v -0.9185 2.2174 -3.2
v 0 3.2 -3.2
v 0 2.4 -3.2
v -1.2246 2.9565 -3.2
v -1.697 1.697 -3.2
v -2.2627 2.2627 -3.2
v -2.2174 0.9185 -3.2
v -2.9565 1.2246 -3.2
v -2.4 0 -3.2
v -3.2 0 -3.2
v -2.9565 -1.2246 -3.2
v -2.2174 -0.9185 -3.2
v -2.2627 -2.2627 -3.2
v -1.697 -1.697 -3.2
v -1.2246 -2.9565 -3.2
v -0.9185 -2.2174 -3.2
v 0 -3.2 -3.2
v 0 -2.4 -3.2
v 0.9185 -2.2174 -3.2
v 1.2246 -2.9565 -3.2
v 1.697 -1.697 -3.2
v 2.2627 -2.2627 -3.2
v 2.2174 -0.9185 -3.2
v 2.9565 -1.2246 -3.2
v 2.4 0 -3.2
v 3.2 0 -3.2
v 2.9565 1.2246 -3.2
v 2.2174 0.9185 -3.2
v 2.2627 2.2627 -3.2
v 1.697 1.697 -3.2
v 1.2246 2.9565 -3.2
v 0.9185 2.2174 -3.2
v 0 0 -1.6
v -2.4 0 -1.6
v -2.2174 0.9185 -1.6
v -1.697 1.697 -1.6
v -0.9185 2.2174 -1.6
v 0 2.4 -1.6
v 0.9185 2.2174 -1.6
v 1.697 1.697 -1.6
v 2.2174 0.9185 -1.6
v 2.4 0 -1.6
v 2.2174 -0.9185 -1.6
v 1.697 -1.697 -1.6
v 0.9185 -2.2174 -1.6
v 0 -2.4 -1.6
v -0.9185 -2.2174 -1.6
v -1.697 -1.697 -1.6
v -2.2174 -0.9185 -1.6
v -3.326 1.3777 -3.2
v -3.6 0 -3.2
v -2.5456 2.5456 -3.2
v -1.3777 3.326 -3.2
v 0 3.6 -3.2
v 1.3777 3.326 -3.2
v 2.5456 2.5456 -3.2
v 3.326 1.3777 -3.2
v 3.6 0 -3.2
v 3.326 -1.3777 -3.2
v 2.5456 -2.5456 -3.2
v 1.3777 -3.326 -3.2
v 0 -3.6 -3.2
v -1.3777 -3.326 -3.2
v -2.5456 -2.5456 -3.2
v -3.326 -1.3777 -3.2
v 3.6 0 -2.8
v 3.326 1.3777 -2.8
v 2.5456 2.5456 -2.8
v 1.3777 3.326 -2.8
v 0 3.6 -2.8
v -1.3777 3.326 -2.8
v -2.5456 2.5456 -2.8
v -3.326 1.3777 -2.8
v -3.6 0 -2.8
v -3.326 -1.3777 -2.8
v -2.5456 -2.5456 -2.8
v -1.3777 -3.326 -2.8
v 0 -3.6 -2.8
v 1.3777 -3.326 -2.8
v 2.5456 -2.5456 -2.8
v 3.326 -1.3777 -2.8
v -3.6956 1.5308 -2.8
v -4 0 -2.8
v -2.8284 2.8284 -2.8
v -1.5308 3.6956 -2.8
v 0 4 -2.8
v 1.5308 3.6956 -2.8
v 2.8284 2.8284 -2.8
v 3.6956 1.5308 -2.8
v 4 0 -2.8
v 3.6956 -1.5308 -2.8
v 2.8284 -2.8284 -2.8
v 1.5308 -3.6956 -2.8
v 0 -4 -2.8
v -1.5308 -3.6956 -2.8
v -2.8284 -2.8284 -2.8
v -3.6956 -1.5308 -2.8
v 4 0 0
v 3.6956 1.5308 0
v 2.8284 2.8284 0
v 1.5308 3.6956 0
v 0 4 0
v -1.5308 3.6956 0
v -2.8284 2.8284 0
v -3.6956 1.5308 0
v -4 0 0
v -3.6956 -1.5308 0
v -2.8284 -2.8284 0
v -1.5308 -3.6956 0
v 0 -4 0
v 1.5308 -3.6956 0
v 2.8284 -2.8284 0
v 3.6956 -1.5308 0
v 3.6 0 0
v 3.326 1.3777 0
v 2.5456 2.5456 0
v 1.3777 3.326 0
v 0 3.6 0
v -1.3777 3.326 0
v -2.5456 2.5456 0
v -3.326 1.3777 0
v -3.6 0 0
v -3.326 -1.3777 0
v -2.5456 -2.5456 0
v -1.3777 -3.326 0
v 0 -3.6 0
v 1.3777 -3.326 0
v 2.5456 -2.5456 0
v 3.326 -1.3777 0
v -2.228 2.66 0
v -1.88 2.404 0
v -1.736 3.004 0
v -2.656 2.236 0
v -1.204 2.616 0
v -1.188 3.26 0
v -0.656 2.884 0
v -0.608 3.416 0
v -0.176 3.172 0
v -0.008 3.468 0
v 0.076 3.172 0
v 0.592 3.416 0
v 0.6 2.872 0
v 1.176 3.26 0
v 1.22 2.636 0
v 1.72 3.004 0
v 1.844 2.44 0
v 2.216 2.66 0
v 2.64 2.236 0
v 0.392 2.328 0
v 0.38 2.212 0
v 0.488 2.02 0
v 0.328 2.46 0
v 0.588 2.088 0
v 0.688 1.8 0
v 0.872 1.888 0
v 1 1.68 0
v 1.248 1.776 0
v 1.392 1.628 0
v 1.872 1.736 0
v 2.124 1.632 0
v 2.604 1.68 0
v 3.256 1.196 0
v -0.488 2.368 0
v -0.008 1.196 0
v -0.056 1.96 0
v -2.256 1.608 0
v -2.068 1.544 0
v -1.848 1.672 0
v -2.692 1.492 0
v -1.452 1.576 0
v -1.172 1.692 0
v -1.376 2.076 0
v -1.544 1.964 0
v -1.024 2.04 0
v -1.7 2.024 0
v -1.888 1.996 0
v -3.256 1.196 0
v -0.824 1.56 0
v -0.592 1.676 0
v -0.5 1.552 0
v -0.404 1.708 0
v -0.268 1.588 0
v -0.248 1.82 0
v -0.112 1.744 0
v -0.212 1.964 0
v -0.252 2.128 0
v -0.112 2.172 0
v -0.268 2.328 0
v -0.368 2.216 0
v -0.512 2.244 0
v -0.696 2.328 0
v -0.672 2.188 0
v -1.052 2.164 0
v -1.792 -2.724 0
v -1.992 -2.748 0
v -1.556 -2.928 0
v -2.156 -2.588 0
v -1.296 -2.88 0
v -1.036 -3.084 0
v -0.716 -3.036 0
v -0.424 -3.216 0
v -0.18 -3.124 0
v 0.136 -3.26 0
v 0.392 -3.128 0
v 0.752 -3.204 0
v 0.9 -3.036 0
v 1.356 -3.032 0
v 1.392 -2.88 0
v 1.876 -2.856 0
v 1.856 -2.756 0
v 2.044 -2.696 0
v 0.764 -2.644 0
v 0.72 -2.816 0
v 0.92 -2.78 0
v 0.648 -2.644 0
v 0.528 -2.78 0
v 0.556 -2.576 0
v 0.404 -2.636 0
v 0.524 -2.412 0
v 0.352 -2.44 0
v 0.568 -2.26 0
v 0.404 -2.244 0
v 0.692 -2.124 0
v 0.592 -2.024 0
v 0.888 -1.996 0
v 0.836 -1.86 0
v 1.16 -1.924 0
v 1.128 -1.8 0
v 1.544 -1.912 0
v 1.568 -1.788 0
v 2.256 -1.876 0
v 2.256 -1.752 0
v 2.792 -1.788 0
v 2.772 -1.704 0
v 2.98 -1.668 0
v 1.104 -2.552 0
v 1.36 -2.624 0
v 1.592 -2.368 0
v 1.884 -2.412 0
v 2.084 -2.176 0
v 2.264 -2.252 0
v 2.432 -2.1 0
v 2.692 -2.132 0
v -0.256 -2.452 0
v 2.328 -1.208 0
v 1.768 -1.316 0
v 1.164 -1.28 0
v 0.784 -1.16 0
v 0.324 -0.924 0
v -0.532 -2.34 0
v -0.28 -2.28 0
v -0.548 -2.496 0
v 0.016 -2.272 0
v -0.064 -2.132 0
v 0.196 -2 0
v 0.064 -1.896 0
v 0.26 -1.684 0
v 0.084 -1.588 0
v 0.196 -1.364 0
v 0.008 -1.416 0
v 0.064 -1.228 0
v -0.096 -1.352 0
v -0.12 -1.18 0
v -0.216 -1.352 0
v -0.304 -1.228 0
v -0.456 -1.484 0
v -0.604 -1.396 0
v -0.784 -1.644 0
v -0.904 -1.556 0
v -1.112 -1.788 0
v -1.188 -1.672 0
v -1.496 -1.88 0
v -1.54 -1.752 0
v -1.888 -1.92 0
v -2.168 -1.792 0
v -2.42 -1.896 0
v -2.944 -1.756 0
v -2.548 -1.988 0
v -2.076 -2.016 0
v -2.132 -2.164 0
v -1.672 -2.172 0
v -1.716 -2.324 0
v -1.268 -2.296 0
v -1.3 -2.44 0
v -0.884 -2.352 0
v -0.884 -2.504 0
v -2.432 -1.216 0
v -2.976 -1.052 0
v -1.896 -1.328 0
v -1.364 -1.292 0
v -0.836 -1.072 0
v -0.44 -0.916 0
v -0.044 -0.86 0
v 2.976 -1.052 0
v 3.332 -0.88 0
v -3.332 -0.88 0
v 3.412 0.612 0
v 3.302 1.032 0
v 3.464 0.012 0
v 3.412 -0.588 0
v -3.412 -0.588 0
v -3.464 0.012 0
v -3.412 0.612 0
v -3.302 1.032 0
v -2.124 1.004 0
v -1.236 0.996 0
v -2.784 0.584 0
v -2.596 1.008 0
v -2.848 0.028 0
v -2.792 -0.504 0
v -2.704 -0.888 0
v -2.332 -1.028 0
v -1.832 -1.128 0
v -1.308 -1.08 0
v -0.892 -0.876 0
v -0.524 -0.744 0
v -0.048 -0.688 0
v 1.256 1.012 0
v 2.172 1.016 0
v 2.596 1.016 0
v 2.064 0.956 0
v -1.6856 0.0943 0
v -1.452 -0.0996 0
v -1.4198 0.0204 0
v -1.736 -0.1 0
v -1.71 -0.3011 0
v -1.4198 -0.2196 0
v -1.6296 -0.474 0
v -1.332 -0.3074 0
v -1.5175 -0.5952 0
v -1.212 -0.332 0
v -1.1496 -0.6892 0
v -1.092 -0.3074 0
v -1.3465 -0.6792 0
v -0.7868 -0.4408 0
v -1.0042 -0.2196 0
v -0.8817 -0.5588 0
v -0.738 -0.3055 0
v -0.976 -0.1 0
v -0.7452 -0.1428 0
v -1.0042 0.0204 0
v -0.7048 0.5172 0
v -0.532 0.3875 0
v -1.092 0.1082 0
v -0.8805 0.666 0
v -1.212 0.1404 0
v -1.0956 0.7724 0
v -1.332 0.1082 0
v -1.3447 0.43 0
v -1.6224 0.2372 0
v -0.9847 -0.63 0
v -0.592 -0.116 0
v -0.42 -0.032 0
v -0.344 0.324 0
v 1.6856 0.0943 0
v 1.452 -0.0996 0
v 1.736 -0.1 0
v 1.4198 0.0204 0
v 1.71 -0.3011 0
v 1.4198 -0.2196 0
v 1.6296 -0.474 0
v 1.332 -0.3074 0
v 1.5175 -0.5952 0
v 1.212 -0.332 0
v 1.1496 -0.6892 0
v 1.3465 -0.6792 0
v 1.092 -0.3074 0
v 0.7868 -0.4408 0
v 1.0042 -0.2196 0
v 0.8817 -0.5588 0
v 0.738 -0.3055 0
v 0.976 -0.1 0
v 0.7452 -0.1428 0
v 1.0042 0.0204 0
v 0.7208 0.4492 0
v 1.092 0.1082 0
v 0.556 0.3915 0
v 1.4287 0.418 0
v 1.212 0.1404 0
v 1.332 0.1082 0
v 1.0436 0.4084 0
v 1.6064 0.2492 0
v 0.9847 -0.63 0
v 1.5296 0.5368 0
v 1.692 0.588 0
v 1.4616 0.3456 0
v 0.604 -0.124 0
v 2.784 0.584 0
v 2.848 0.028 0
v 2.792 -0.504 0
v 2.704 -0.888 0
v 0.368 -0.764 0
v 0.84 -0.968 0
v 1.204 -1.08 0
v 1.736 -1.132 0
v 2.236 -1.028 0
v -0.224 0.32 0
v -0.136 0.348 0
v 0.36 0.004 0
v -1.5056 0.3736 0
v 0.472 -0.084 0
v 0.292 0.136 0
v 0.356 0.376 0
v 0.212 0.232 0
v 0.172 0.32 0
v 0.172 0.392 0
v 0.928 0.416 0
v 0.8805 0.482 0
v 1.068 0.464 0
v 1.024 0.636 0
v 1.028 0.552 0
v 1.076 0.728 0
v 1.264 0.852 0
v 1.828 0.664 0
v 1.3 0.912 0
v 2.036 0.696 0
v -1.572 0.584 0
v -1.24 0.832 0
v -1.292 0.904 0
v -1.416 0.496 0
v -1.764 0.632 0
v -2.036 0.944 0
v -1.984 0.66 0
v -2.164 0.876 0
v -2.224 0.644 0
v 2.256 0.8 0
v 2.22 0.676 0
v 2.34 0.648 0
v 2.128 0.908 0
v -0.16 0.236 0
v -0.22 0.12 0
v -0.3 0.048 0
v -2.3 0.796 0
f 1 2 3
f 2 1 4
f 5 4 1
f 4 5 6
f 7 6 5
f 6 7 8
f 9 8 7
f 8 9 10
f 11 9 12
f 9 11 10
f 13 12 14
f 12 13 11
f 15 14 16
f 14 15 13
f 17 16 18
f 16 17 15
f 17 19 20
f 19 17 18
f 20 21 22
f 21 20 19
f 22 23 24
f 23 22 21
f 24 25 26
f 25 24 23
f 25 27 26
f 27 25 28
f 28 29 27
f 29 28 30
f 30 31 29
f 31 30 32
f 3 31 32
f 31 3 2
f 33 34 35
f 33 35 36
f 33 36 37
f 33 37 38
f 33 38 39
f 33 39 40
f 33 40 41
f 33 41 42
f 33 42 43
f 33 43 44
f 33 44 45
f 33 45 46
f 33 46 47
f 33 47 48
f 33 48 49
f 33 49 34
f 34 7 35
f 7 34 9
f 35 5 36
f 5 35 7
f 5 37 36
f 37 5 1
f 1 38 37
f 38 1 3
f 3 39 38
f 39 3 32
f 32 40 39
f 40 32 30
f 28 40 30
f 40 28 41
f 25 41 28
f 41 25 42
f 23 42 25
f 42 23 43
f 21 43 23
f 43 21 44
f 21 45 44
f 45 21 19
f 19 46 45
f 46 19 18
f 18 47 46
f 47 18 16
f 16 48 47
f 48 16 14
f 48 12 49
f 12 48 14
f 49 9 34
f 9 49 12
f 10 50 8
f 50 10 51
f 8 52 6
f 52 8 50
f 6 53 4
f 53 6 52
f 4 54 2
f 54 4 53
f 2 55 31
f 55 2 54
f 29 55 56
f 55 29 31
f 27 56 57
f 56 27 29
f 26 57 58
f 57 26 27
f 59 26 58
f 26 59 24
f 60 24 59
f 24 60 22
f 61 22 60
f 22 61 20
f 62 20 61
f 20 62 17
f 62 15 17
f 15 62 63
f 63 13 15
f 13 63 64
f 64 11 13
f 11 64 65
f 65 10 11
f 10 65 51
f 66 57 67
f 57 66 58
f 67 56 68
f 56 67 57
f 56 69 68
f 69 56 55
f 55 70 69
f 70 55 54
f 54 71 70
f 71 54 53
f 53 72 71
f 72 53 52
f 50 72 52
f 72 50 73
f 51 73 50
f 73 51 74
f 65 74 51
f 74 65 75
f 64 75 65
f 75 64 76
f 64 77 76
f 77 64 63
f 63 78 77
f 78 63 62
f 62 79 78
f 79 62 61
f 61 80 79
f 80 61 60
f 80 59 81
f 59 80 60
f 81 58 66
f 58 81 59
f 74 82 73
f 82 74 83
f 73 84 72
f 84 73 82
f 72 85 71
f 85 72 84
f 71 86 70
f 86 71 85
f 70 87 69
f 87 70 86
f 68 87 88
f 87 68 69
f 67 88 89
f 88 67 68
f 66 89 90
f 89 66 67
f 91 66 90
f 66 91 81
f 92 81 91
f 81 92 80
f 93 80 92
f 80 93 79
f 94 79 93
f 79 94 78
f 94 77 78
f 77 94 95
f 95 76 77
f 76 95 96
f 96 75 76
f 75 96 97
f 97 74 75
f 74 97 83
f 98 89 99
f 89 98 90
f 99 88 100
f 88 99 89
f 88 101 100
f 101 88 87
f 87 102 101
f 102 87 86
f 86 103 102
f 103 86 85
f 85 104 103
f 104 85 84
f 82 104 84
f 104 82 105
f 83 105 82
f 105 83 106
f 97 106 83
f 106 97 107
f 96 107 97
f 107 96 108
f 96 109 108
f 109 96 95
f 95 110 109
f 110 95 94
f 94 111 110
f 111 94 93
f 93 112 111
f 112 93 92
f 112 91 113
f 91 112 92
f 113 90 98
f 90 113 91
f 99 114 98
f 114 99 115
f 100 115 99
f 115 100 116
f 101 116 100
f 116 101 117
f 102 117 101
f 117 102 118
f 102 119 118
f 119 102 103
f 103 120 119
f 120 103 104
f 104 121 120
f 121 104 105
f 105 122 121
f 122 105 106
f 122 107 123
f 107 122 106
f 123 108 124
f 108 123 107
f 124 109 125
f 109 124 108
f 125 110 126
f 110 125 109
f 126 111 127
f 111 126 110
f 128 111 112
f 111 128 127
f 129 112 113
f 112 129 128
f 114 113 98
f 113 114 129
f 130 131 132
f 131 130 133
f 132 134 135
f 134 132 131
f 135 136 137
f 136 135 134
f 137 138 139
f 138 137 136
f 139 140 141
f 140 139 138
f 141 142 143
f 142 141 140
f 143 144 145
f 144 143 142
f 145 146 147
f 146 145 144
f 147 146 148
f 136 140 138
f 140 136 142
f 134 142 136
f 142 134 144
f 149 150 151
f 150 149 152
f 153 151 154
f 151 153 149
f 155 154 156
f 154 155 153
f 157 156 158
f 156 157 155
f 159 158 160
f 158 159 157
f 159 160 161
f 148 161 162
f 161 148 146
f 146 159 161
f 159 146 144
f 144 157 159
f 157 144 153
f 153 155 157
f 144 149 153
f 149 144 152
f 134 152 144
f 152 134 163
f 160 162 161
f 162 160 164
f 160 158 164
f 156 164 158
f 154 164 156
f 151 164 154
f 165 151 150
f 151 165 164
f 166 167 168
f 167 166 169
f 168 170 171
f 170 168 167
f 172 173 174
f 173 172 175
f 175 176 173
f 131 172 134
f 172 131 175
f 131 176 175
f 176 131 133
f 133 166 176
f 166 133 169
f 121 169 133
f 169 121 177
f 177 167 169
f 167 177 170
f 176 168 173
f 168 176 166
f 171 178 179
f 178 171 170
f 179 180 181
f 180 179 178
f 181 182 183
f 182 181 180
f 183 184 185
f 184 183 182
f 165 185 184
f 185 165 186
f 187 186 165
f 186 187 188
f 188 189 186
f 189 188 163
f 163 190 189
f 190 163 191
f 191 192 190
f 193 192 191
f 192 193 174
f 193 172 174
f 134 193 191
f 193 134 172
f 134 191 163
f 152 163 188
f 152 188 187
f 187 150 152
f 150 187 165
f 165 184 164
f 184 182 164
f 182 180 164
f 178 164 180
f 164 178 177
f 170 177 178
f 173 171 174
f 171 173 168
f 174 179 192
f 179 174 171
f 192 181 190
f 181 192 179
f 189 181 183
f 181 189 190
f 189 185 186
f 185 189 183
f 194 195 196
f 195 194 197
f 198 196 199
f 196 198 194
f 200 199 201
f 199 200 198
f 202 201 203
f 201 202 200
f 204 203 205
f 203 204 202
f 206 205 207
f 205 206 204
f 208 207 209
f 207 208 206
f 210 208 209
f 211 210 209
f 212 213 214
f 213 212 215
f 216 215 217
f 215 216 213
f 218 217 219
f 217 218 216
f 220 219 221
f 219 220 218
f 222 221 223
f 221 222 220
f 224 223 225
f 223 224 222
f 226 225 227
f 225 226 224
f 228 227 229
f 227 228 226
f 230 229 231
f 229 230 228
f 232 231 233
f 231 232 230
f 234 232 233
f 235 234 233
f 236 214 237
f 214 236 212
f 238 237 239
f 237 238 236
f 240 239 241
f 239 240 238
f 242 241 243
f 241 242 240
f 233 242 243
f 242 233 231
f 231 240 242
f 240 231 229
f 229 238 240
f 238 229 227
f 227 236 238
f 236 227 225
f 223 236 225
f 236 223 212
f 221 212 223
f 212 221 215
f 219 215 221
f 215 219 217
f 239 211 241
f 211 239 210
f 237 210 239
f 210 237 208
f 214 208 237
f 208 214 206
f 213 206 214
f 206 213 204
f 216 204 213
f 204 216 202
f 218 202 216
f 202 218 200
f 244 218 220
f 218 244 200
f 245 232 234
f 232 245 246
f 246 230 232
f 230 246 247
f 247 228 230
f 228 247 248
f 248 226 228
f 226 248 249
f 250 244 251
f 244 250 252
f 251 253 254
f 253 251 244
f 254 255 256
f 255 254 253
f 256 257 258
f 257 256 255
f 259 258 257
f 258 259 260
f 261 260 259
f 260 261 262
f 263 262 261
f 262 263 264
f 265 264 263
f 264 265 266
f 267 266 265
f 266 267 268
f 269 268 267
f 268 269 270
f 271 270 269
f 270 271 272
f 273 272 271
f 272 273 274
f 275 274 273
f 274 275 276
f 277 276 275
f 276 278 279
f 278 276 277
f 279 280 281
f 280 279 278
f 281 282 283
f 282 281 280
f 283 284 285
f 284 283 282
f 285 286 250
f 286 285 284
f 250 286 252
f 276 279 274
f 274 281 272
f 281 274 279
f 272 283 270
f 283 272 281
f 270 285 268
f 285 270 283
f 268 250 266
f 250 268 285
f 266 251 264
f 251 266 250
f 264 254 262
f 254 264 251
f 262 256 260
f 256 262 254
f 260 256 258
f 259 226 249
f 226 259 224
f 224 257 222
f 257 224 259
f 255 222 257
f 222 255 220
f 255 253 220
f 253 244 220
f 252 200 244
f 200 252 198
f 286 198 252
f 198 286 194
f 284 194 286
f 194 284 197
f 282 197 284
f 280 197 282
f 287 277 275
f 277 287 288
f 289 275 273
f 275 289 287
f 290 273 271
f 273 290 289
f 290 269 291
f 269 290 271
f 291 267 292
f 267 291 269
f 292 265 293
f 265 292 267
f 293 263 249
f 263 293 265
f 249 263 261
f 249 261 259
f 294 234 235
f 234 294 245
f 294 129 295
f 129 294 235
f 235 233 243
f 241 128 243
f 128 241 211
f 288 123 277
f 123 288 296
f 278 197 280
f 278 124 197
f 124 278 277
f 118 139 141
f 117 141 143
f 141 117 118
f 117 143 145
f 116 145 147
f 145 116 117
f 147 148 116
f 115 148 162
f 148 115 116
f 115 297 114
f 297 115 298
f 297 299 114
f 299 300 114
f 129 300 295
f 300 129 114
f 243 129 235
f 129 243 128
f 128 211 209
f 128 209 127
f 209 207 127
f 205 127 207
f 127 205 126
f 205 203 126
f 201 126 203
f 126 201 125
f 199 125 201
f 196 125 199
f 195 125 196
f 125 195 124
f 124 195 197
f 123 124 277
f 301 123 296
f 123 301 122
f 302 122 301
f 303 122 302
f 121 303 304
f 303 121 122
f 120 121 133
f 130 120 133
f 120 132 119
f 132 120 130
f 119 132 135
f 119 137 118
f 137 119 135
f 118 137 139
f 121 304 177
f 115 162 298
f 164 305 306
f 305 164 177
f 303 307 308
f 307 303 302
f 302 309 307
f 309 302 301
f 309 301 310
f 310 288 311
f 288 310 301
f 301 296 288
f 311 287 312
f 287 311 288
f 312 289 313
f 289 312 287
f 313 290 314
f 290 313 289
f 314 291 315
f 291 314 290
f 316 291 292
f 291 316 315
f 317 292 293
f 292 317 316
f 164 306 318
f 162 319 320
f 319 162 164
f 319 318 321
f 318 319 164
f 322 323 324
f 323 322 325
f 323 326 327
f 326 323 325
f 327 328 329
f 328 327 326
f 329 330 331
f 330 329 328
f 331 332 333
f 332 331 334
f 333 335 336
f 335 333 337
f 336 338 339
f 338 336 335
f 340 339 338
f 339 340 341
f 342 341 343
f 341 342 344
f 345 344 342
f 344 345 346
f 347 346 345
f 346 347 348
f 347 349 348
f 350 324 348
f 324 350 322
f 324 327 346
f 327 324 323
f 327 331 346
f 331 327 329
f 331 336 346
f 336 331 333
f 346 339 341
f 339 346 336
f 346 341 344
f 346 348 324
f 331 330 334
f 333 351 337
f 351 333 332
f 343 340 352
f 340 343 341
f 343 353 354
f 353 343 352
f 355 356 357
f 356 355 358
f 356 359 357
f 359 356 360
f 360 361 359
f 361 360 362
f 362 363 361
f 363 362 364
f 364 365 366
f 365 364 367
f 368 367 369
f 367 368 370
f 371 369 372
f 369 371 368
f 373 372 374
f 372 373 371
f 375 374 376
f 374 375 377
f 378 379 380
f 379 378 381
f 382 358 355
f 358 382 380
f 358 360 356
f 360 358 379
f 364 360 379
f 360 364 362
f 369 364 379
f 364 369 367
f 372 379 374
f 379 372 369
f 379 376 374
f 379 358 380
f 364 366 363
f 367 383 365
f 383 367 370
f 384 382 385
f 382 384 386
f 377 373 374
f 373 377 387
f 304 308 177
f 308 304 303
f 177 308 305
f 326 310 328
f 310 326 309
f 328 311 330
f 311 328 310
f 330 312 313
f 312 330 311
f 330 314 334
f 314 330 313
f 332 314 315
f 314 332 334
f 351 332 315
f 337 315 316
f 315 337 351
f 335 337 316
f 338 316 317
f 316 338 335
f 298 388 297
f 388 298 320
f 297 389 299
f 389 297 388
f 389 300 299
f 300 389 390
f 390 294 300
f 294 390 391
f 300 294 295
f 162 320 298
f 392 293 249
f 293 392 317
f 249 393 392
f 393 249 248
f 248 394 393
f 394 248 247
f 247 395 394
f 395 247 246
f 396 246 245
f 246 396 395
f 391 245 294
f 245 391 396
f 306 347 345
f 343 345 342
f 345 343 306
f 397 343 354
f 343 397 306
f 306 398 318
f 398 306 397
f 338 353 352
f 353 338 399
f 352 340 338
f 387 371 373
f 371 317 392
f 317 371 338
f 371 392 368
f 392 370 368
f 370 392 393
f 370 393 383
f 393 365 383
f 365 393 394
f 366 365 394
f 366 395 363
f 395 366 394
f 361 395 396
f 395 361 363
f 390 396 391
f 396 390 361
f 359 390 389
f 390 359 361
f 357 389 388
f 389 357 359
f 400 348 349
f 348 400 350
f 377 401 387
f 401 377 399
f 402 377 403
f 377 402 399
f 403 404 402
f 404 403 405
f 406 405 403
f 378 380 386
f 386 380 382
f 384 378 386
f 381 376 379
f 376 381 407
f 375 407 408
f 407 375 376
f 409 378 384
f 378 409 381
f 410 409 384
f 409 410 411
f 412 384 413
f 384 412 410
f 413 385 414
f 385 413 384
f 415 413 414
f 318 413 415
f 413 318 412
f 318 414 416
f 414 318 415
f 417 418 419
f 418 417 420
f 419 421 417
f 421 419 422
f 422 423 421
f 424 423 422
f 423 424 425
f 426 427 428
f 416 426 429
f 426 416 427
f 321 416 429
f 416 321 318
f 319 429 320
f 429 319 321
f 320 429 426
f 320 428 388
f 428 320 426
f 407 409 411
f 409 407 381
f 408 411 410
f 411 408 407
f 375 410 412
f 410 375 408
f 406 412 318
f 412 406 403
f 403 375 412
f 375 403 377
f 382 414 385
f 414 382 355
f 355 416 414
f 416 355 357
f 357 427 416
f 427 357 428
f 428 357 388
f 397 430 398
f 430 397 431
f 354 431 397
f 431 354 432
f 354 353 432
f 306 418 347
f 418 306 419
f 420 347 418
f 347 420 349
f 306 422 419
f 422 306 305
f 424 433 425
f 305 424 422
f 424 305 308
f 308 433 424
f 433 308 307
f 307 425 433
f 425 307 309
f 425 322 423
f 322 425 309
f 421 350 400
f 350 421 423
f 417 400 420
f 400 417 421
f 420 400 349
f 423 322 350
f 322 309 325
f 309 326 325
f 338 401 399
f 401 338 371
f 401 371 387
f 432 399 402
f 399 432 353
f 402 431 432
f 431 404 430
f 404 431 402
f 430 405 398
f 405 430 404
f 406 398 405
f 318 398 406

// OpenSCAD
use <../lib.scad>
use <../p/4-4ering.scad>
use <s/98138pn0s01.scad>
use <s/98138s01.scad>
$fa=1; $fs=0.2;
function ldraw_lib__98138pn6(realsolid=false) = [
// 0 Tile  1 x  1 Round with Ninjago Trapped Kai Patternn
// 0 Name: 98138pn6.dat
// 0 Author: Gerald Lasser [GeraldLasser]
// 0 !LDRAW_ORG Part UPDATE 2017-01
// 0 !LICENSE Licensed under CC BY 2.0 and CC BY 4.0 : see CAreadme.txt
// 
// 0 BFC CERTIFY CCW
  [0,"BFC","CERTIFY"],
  [0,"BFC","CCW"],
// 
// 0 !KEYWORDS BrickLink 98138pb048
// 
// 0 !HISTORY 2017-12-30 [PTadmin] Official Update 2017-01
// 
// 
// 1 16 0 0 0 1 0 0 0 1 0 0 0 1 s\98138s01.dat
  [1,16,0,0,0,1,0,0,0,1,0,0,0,1, ldraw_lib__s__98138s01(realsolid)],
// 1 16 0 0 0 9 0 0 0 1 0 0 0 9 4-4ering.dat
  [1,16,0,0,0,9,0,0,0,1,0,0,0,9, ldraw_lib__4_4ering(realsolid)],
// 1 16 0 0 0 1 0 0 0 1 0 0 0 1 s\98138pn0s01.dat
  [1,16,0,0,0,1,0,0,0,1,0,0,0,1, ldraw_lib__s__98138pn0s01(realsolid)],
// 4 0 -5.31 0 2.51 -3.09 0 2.49 -0.02 0 2.99 -8.14 0 2.99
  [4,0,-5.31,0,2.51,-3.09,0,2.49,-0.02,0,2.99,-8.14,0,2.99],
// 4 0 -6.96 0 1.46 -6.49 0 2.52 -8.53 0 1.53 -8.66 0 0.03
  [4,0,-6.96,0,1.46,-6.49,0,2.52,-8.53,0,1.53,-8.66,0,0.03],
// 4 0 -7.12 0 0.07 -6.96 0 1.46 -8.66 0 0.03 -8.53 0 -1.47
  [4,0,-7.12,0,0.07,-6.96,0,1.46,-8.66,0,0.03,-8.53,0,-1.47],
// 3 0 -7.12 0 0.07 -8.53 0 -1.47 -6.98 0 -1.26
  [3,0,-7.12,0,0.07,-8.53,0,-1.47,-6.98,0,-1.26],
// 4 0 -6.76 0 -2.22 -6.98 0 -1.26 -8.53 0 -1.47 -7.44 0 -2.63
  [4,0,-6.76,0,-2.22,-6.98,0,-1.26,-8.53,0,-1.47,-7.44,0,-2.63],
// 3 0 -8.53 0 -1.47 -8.33 0 -2.2 -7.44 0 -2.63
  [3,0,-8.53,0,-1.47,-8.33,0,-2.2,-7.44,0,-2.63],
// 4 0 -6.08 0 -3.04 -5.83 0 -2.57 -6.76 0 -2.22 -7.44 0 -2.63
  [4,0,-6.08,0,-3.04,-5.83,0,-2.57,-6.76,0,-2.22,-7.44,0,-2.63],
// 4 0 -4.74 0 -3.32 -4.58 0 -2.82 -5.83 0 -2.57 -6.08 0 -3.04
  [4,0,-4.74,0,-3.32,-4.58,0,-2.82,-5.83,0,-2.57,-6.08,0,-3.04],
// 4 0 -3.41 0 -3.23 -3.27 0 -2.7 -4.58 0 -2.82 -4.74 0 -3.32
  [4,0,-3.41,0,-3.23,-3.27,0,-2.7,-4.58,0,-2.82,-4.74,0,-3.32],
// 4 0 -2.09 0 -2.68 -2.23 0 -2.19 -3.27 0 -2.7 -3.41 0 -3.23
  [4,0,-2.09,0,-2.68,-2.23,0,-2.19,-3.27,0,-2.7,-3.41,0,-3.23],
// 4 0 -1.1 0 -2.29 -1.31 0 -1.86 -2.23 0 -2.19 -2.09 0 -2.68
  [4,0,-1.1,0,-2.29,-1.31,0,-1.86,-2.23,0,-2.19,-2.09,0,-2.68],
// 4 0 -0.11 0 -2.15 -0.12 0 -1.72 -1.31 0 -1.86 -1.1 0 -2.29
  [4,0,-0.11,0,-2.15,-0.12,0,-1.72,-1.31,0,-1.86,-1.1,0,-2.29],
// 3 0 -0.02 0 2.99 -3.09 0 2.49 3.14 0 2.53
  [3,0,-0.02,0,2.99,-3.09,0,2.49,3.14,0,2.53],
// 4 0 5.43 0 2.54 6.49 0 2.54 8.14 0 2.99 -0.02 0 2.99
  [4,0,5.43,0,2.54,6.49,0,2.54,8.14,0,2.99,-0.02,0,2.99],
// 4 0 5.43 0 2.54 -0.02 0 2.99 3.14 0 2.53 5.16 0 2.39
  [4,0,5.43,0,2.54,-0.02,0,2.99,3.14,0,2.53,5.16,0,2.39],
// 4 0 -3.63 0 -0.249 -3.5496 0 0.051 -4.2139 0 0.2357 -4.34 0 -0.25
  [4,0,-3.63,0,-0.249,-3.5496,0,0.051,-4.2139,0,0.2357,-4.34,0,-0.25],
// 4 0 -3.5496 0 -0.549 -3.63 0 -0.249 -4.34 0 -0.25 -4.2749 0 -0.7527
  [4,0,-3.5496,0,-0.549,-3.63,0,-0.249,-4.34,0,-0.25,-4.2749,0,-0.7527],
// 4 0 -3.33 0 -0.7686 -3.5496 0 -0.549 -4.2749 0 -0.7527 -4.0741 0 -1.1851
  [4,0,-3.33,0,-0.7686,-3.5496,0,-0.549,-4.2749,0,-0.7527,-4.0741,0,-1.1851],
// 4 0 -3.33 0 -0.7686 -4.0741 0 -1.1851 -3.7937 0 -1.4879 -3.03 0 -0.83
  [4,0,-3.33,0,-0.7686,-4.0741,0,-1.1851,-3.7937,0,-1.4879,-3.03,0,-0.83],
// 4 0 -2.874 0 -1.723 -2.73 0 -0.7686 -3.03 0 -0.83 -3.3663 0 -1.6979
  [4,0,-2.874,0,-1.723,-2.73,0,-0.7686,-3.03,0,-0.83,-3.3663,0,-1.6979],
// 4 0 -2.5104 0 -0.549 -2.73 0 -0.7686 -2.2043 0 -1.3969 -1.9669 0 -1.1021
  [4,0,-2.5104,0,-0.549,-2.73,0,-0.7686,-2.2043,0,-1.3969,-1.9669,0,-1.1021],
// 4 0 -2.5104 0 -0.549 -1.9669 0 -1.1021 -1.8451 0 -0.7637 -2.44 0 -0.25
  [4,0,-2.5104,0,-0.549,-1.9669,0,-1.1021,-1.8451,0,-0.7637,-2.44,0,-0.25],
// 4 0 -2.44 0 -0.25 -1.8451 0 -0.7637 -1.863 0 -0.357 -2.5104 0 0.051
  [4,0,-2.44,0,-0.25,-1.8451,0,-0.7637,-1.863,0,-0.357,-2.5104,0,0.051],
// 4 0 -2.5104 0 0.051 -1.3301 0 0.9687 -1.7619 0 1.2931 -2.73 0 0.2706
  [4,0,-2.5104,0,0.051,-1.3301,0,0.9687,-1.7619,0,1.2931,-2.73,0,0.2706],
// 4 0 -2.73 0 0.2706 -1.7619 0 1.2931 -2.2013 0 1.6649 -3.03 0 0.351
  [4,0,-2.73,0,0.2706,-1.7619,0,1.2931,-2.2013,0,1.6649,-3.03,0,0.351],
// 4 0 -3.03 0 0.351 -2.2013 0 1.6649 -2.739 0 1.931 -3.33 0 0.2706
  [4,0,-3.03,0,0.351,-2.2013,0,1.6649,-2.739,0,1.931,-3.33,0,0.2706],
// 3 0 -2.739 0 1.931 -3.3617 0 1.0749 -3.33 0 0.2706
  [3,0,-2.739,0,1.931,-3.3617,0,1.0749,-3.33,0,0.2706],
// 4 0 -3.5496 0 0.051 -3.33 0 0.2706 -4.0561 0 0.5931 -4.2139 0 0.2357
  [4,0,-3.5496,0,0.051,-3.33,0,0.2706,-4.0561,0,0.5931,-4.2139,0,0.2357],
// 4 14 -3.03 0 0.351 -3.5496 0 0.051 -3.63 0 -0.249 -3.5496 0 -0.549
  [4,14,-3.03,0,0.351,-3.5496,0,0.051,-3.63,0,-0.249,-3.5496,0,-0.549],
// 4 14 -3.03 0 0.351 -3.5496 0 -0.549 -3.33 0 -0.7686 -3.03 0 -0.83
  [4,14,-3.03,0,0.351,-3.5496,0,-0.549,-3.33,0,-0.7686,-3.03,0,-0.83],
// 4 14 -3.03 0 0.351 -3.03 0 -0.83 -2.73 0 -0.7686 -2.5104 0 -0.549
  [4,14,-3.03,0,0.351,-3.03,0,-0.83,-2.73,0,-0.7686,-2.5104,0,-0.549],
// 4 14 -3.03 0 0.351 -2.5104 0 -0.549 -2.44 0 -0.25 -2.5104 0 0.051
  [4,14,-3.03,0,0.351,-2.5104,0,-0.549,-2.44,0,-0.25,-2.5104,0,0.051],
// 3 14 -3.03 0 0.351 -2.5104 0 0.051 -2.73 0 0.2706
  [3,14,-3.03,0,0.351,-2.5104,0,0.051,-2.73,0,0.2706],
// 3 14 -3.03 0 0.351 -3.33 0 0.2706 -3.5496 0 0.051
  [3,14,-3.03,0,0.351,-3.33,0,0.2706,-3.5496,0,0.051],
// 3 0 -3.03 0 -0.83 -3.7937 0 -1.4879 -3.3663 0 -1.6979
  [3,0,-3.03,0,-0.83,-3.7937,0,-1.4879,-3.3663,0,-1.6979],
// 4 0 -2.73 0 -0.7686 -2.874 0 -1.723 -2.4617 0 -1.5749 -2.2043 0 -1.3969
  [4,0,-2.73,0,-0.7686,-2.874,0,-1.723,-2.4617,0,-1.5749,-2.2043,0,-1.3969],
// 4 0 -1.3301 0 0.9687 -2.5104 0 0.051 -1.863 0 -0.357 -1.48 0 -0.29
  [4,0,-1.3301,0,0.9687,-2.5104,0,0.051,-1.863,0,-0.357,-1.48,0,-0.29],
// 4 0 -1.3301 0 0.9687 -1.48 0 -0.29 -1.05 0 -0.08 -0.86 0 0.81
  [4,0,-1.3301,0,0.9687,-1.48,0,-0.29,-1.05,0,-0.08,-0.86,0,0.81],
// 4 0 4.2139 0 0.2357 3.5496 0 0.051 3.63 0 -0.249 4.34 0 -0.25
  [4,0,4.2139,0,0.2357,3.5496,0,0.051,3.63,0,-0.249,4.34,0,-0.25],
// 4 0 4.34 0 -0.25 3.63 0 -0.249 3.5496 0 -0.549 4.2749 0 -0.7527
  [4,0,4.34,0,-0.25,3.63,0,-0.249,3.5496,0,-0.549,4.2749,0,-0.7527],
// 4 0 4.2749 0 -0.7527 3.5496 0 -0.549 3.33 0 -0.7686 4.0741 0 -1.1851
  [4,0,4.2749,0,-0.7527,3.5496,0,-0.549,3.33,0,-0.7686,4.0741,0,-1.1851],
// 4 0 3.7937 0 -1.4879 4.0741 0 -1.1851 3.33 0 -0.7686 3.03 0 -0.83
  [4,0,3.7937,0,-1.4879,4.0741,0,-1.1851,3.33,0,-0.7686,3.03,0,-0.83],
// 4 0 3.03 0 -0.83 2.73 0 -0.7686 2.874 0 -1.723 3.3663 0 -1.6979
  [4,0,3.03,0,-0.83,2.73,0,-0.7686,2.874,0,-1.723,3.3663,0,-1.6979],
// 4 0 2.2043 0 -1.3969 2.73 0 -0.7686 2.5104 0 -0.549 1.9669 0 -1.1021
  [4,0,2.2043,0,-1.3969,2.73,0,-0.7686,2.5104,0,-0.549,1.9669,0,-1.1021],
// 4 0 1.8451 0 -0.7637 1.9669 0 -1.1021 2.5104 0 -0.549 2.44 0 -0.25
  [4,0,1.8451,0,-0.7637,1.9669,0,-1.1021,2.5104,0,-0.549,2.44,0,-0.25],
// 4 0 1.863 0 -0.357 1.8451 0 -0.7637 2.44 0 -0.25 2.5104 0 0.051
  [4,0,1.863,0,-0.357,1.8451,0,-0.7637,2.44,0,-0.25,2.5104,0,0.051],
// 4 0 1.8019 0 1.1231 1.3901 0 0.9787 2.5104 0 0.051 2.73 0 0.2706
  [4,0,1.8019,0,1.1231,1.3901,0,0.9787,2.5104,0,0.051,2.73,0,0.2706],
// 4 0 2.609 0 1.021 3.03 0 0.351 3.33 0 0.2706 3.5717 0 1.0449
  [4,0,2.609,0,1.021,3.03,0,0.351,3.33,0,0.2706,3.5717,0,1.0449],
// 4 0 4.0161 0 0.6231 3.33 0 0.2706 3.5496 0 0.051 4.2139 0 0.2357
  [4,0,4.0161,0,0.6231,3.33,0,0.2706,3.5496,0,0.051,4.2139,0,0.2357],
// 4 14 3.63 0 -0.249 3.5496 0 0.051 3.03 0 0.351 3.5496 0 -0.549
  [4,14,3.63,0,-0.249,3.5496,0,0.051,3.03,0,0.351,3.5496,0,-0.549],
// 4 14 3.33 0 -0.7686 3.5496 0 -0.549 3.03 0 0.351 3.03 0 -0.83
  [4,14,3.33,0,-0.7686,3.5496,0,-0.549,3.03,0,0.351,3.03,0,-0.83],
// 4 14 2.73 0 -0.7686 3.03 0 -0.83 3.03 0 0.351 2.5104 0 -0.549
  [4,14,2.73,0,-0.7686,3.03,0,-0.83,3.03,0,0.351,2.5104,0,-0.549],
// 4 14 2.44 0 -0.25 2.5104 0 -0.549 3.03 0 0.351 2.5104 0 0.051
  [4,14,2.44,0,-0.25,2.5104,0,-0.549,3.03,0,0.351,2.5104,0,0.051],
// 3 14 3.03 0 0.351 2.73 0 0.2706 2.5104 0 0.051
  [3,14,3.03,0,0.351,2.73,0,0.2706,2.5104,0,0.051],
// 3 14 3.03 0 0.351 3.5496 0 0.051 3.33 0 0.2706
  [3,14,3.03,0,0.351,3.5496,0,0.051,3.33,0,0.2706],
// 3 0 3.03 0 -0.83 3.3663 0 -1.6979 3.7937 0 -1.4879
  [3,0,3.03,0,-0.83,3.3663,0,-1.6979,3.7937,0,-1.4879],
// 4 0 2.4617 0 -1.5749 2.874 0 -1.723 2.73 0 -0.7686 2.2043 0 -1.3969
  [4,0,2.4617,0,-1.5749,2.874,0,-1.723,2.73,0,-0.7686,2.2043,0,-1.3969],
// 4 14 4.0161 0 0.6231 4.23 0 1.47 3.824 0 1.342 3.6539 0 0.864
  [4,14,4.0161,0,0.6231,4.23,0,1.47,3.824,0,1.342,3.6539,0,0.864],
// 4 0 1.863 0 -0.357 2.5104 0 0.051 1.3901 0 0.9787 1.51 0 -0.31
  [4,0,1.863,0,-0.357,2.5104,0,0.051,1.3901,0,0.9787,1.51,0,-0.31],
// 4 0 -6.49 0 2.52 -8.14 0 2.99 -8.255 0 2.58 -8.53 0 1.53
  [4,0,-6.49,0,2.52,-8.14,0,2.99,-8.255,0,2.58,-8.53,0,1.53],
// 3 0 -8.14 0 2.99 -6.49 0 2.52 -5.31 0 2.51
  [3,0,-8.14,0,2.99,-6.49,0,2.52,-5.31,0,2.51],
// 4 14 -4.2749 0 -0.7527 -7.12 0 0.07 -6.98 0 -1.26 -4.0741 0 -1.1851
  [4,14,-4.2749,0,-0.7527,-7.12,0,0.07,-6.98,0,-1.26,-4.0741,0,-1.1851],
// 4 14 -4.0741 0 -1.1851 -6.98 0 -1.26 -6.76 0 -2.22 -3.7937 0 -1.4879
  [4,14,-4.0741,0,-1.1851,-6.98,0,-1.26,-6.76,0,-2.22,-3.7937,0,-1.4879],
// 4 14 -3.7937 0 -1.4879 -6.76 0 -2.22 -5.83 0 -2.57 -4.58 0 -2.82
  [4,14,-3.7937,0,-1.4879,-6.76,0,-2.22,-5.83,0,-2.57,-4.58,0,-2.82],
// 4 14 -3.3663 0 -1.6979 -3.7937 0 -1.4879 -4.58 0 -2.82 -3.27 0 -2.7
  [4,14,-3.3663,0,-1.6979,-3.7937,0,-1.4879,-4.58,0,-2.82,-3.27,0,-2.7],
// 4 14 -2.874 0 -1.723 -3.3663 0 -1.6979 -3.27 0 -2.7 -2.23 0 -2.19
  [4,14,-2.874,0,-1.723,-3.3663,0,-1.6979,-3.27,0,-2.7,-2.23,0,-2.19],
// 3 14 -2.4617 0 -1.5749 -2.874 0 -1.723 -2.23 0 -2.19
  [3,14,-2.4617,0,-1.5749,-2.874,0,-1.723,-2.23,0,-2.19],
// 4 14 -2.2043 0 -1.3969 -2.4617 0 -1.5749 -2.23 0 -2.19 -1.31 0 -1.86
  [4,14,-2.2043,0,-1.3969,-2.4617,0,-1.5749,-2.23,0,-2.19,-1.31,0,-1.86],
// 3 14 -1.9669 0 -1.1021 -2.2043 0 -1.3969 -1.31 0 -1.86
  [3,14,-1.9669,0,-1.1021,-2.2043,0,-1.3969,-1.31,0,-1.86],
// 4 14 -1.8451 0 -0.7637 -1.9669 0 -1.1021 -1.31 0 -1.86 -0.12 0 -1.72
  [4,14,-1.8451,0,-0.7637,-1.9669,0,-1.1021,-1.31,0,-1.86,-0.12,0,-1.72],
// 4 0 8.53 0 1.53 8.255 0 2.58 6.49 0 2.54 6.96 0 1.46
  [4,0,8.53,0,1.53,8.255,0,2.58,6.49,0,2.54,6.96,0,1.46],
// 4 0 8.66 0 0.03 8.53 0 1.53 6.96 0 1.46 7.12 0 0.07
  [4,0,8.66,0,0.03,8.53,0,1.53,6.96,0,1.46,7.12,0,0.07],
// 4 0 8.53 0 -1.47 8.66 0 0.03 7.12 0 0.07 6.98 0 -1.26
  [4,0,8.53,0,-1.47,8.66,0,0.03,7.12,0,0.07,6.98,0,-1.26],
// 4 0 8.53 0 -1.47 6.98 0 -1.26 6.76 0 -2.22 7.44 0 -2.63
  [4,0,8.53,0,-1.47,6.98,0,-1.26,6.76,0,-2.22,7.44,0,-2.63],
// 3 0 8.53 0 -1.47 7.44 0 -2.63 8.33 0 -2.2
  [3,0,8.53,0,-1.47,7.44,0,-2.63,8.33,0,-2.2],
// 3 0 8.14 0 2.99 6.49 0 2.54 8.255 0 2.58
  [3,0,8.14,0,2.99,6.49,0,2.54,8.255,0,2.58],
// 4 0 0.92 0 -1.91 -0.12 0 -1.72 -0.11 0 -2.15 0.81 0 -2.31
  [4,0,0.92,0,-1.91,-0.12,0,-1.72,-0.11,0,-2.15,0.81,0,-2.31],
// 4 0 2.1 0 -2.42 0.92 0 -1.91 0.81 0 -2.31 1.96 0 -2.9
  [4,0,2.1,0,-2.42,0.92,0,-1.91,0.81,0,-2.31,1.96,0,-2.9],
// 4 0 3.01 0 -2.7 2.1 0 -2.42 1.96 0 -2.9 2.91 0 -3.2
  [4,0,3.01,0,-2.7,2.1,0,-2.42,1.96,0,-2.9,2.91,0,-3.2],
// 4 0 4.34 0 -2.83 3.01 0 -2.7 2.91 0 -3.2 4.42 0 -3.29
  [4,0,4.34,0,-2.83,3.01,0,-2.7,2.91,0,-3.2,4.42,0,-3.29],
// 4 0 5.59 0 -2.57 4.34 0 -2.83 4.42 0 -3.29 5.82 0 -3.02
  [4,0,5.59,0,-2.57,4.34,0,-2.83,4.42,0,-3.29,5.82,0,-3.02],
// 4 0 5.82 0 -3.02 7.44 0 -2.63 6.76 0 -2.22 5.59 0 -2.57
  [4,0,5.82,0,-3.02,7.44,0,-2.63,6.76,0,-2.22,5.59,0,-2.57],
// 3 14 -3.09 0 2.49 -2.739 0 1.931 -2.2013 0 1.6649
  [3,14,-3.09,0,2.49,-2.739,0,1.931,-2.2013,0,1.6649],
// 4 14 -3.09 0 2.49 -2.2013 0 1.6649 -1.7619 0 1.2931 -1.3301 0 0.9687
  [4,14,-3.09,0,2.49,-2.2013,0,1.6649,-1.7619,0,1.2931,-1.3301,0,0.9687],
// 4 14 -3.09 0 2.49 -1.3301 0 0.9687 -0.86 0 0.81 -0.56 0 0.8
  [4,14,-3.09,0,2.49,-1.3301,0,0.9687,-0.86,0,0.81,-0.56,0,0.8],
// 4 14 -3.09 0 2.49 -0.56 0 0.8 -0.34 0 0.87 3.14 0 2.53
  [4,14,-3.09,0,2.49,-0.56,0,0.8,-0.34,0,0.87,3.14,0,2.53],
// 4 14 -1.05 0 -0.08 -1.48 0 -0.29 -1.8451 0 -0.7637 0.9 0 0.01
  [4,14,-1.05,0,-0.08,-1.48,0,-0.29,-1.8451,0,-0.7637,0.9,0,0.01],
// 3 14 -1.48 0 -0.29 -1.863 0 -0.357 -1.8451 0 -0.7637
  [3,14,-1.48,0,-0.29,-1.863,0,-0.357,-1.8451,0,-0.7637],
// 3 14 1.51 0 -0.31 1.8451 0 -0.7637 1.863 0 -0.357
  [3,14,1.51,0,-0.31,1.8451,0,-0.7637,1.863,0,-0.357],
// 4 14 1.8451 0 -0.7637 -1.8451 0 -0.7637 -0.12 0 -1.72 0.92 0 -1.91
  [4,14,1.8451,0,-0.7637,-1.8451,0,-0.7637,-0.12,0,-1.72,0.92,0,-1.91],
// 3 14 1.8451 0 -0.7637 0.92 0 -1.91 1.9669 0 -1.1021
  [3,14,1.8451,0,-0.7637,0.92,0,-1.91,1.9669,0,-1.1021],
// 4 14 2.2043 0 -1.3969 1.9669 0 -1.1021 0.92 0 -1.91 2.1 0 -2.42
  [4,14,2.2043,0,-1.3969,1.9669,0,-1.1021,0.92,0,-1.91,2.1,0,-2.42],
// 3 14 2.2043 0 -1.3969 2.1 0 -2.42 2.4617 0 -1.5749
  [3,14,2.2043,0,-1.3969,2.1,0,-2.42,2.4617,0,-1.5749],
// 4 14 2.874 0 -1.723 2.4617 0 -1.5749 2.1 0 -2.42 3.01 0 -2.7
  [4,14,2.874,0,-1.723,2.4617,0,-1.5749,2.1,0,-2.42,3.01,0,-2.7],
// 3 14 3.3663 0 -1.6979 2.874 0 -1.723 3.01 0 -2.7
  [3,14,3.3663,0,-1.6979,2.874,0,-1.723,3.01,0,-2.7],
// 4 14 3.7937 0 -1.4879 3.3663 0 -1.6979 3.01 0 -2.7 4.34 0 -2.83
  [4,14,3.7937,0,-1.4879,3.3663,0,-1.6979,3.01,0,-2.7,4.34,0,-2.83],
// 4 14 3.7937 0 -1.4879 4.34 0 -2.83 5.59 0 -2.57 4.0741 0 -1.1851
  [4,14,3.7937,0,-1.4879,4.34,0,-2.83,5.59,0,-2.57,4.0741,0,-1.1851],
// 4 14 4.0741 0 -1.1851 5.59 0 -2.57 6.76 0 -2.22 6.98 0 -1.26
  [4,14,4.0741,0,-1.1851,5.59,0,-2.57,6.76,0,-2.22,6.98,0,-1.26],
// 4 14 4.2749 0 -0.7527 4.0741 0 -1.1851 6.98 0 -1.26 7.12 0 0.07
  [4,14,4.2749,0,-0.7527,4.0741,0,-1.1851,6.98,0,-1.26,7.12,0,0.07],
// 4 14 4.34 0 -0.25 4.2749 0 -0.7527 7.12 0 0.07 6.96 0 1.46
  [4,14,4.34,0,-0.25,4.2749,0,-0.7527,7.12,0,0.07,6.96,0,1.46],
// 4 0 -3.7639 0 0.934 -4.0561 0 0.5931 -3.33 0 0.2706 -3.3617 0 1.0749
  [4,0,-3.7639,0,0.934,-4.0561,0,0.5931,-3.33,0,0.2706,-3.3617,0,1.0749],
// 4 0 1.18 0 -0.21 1.51 0 -0.31 1.3901 0 0.9787 0.9 0 0.01
  [4,0,1.18,0,-0.21,1.51,0,-0.31,1.3901,0,0.9787,0.9,0,0.01],
// 4 0 0.73 0 0.34 0.9 0 0.01 1.3901 0 0.9787 0.89 0 0.94
  [4,0,0.73,0,0.34,0.9,0,0.01,1.3901,0,0.9787,0.89,0,0.94],
// 4 0 0.53 0 0.58 0.73 0 0.34 0.89 0 0.94 0.43 0 0.8
  [4,0,0.53,0,0.58,0.73,0,0.34,0.89,0,0.94,0.43,0,0.8],
// 3 0 0.43 0 0.98 0.43 0 0.8 0.89 0 0.94
  [3,0,0.43,0,0.98,0.43,0,0.8,0.89,0,0.94],
// 3 0 3.5717 0 1.0449 3.33 0 0.2706 3.6539 0 0.864
  [3,0,3.5717,0,1.0449,3.33,0,0.2706,3.6539,0,0.864],
// 3 0 3.6539 0 0.864 3.33 0 0.2706 4.0161 0 0.6231
  [3,0,3.6539,0,0.864,3.33,0,0.2706,4.0161,0,0.6231],
// 3 14 3.824 0 1.342 3.5717 0 1.0449 3.6539 0 0.864
  [3,14,3.824,0,1.342,3.5717,0,1.0449,3.6539,0,0.864],
// 4 0 2.73 0 0.2706 3.03 0 0.351 2.609 0 1.021 2.32 0 1.04
  [4,0,2.73,0,0.2706,3.03,0,0.351,2.609,0,1.021,2.32,0,1.04],
// 4 0 1.8019 0 1.1231 2.73 0 0.2706 2.32 0 1.04 2.2013 0 1.2049
  [4,0,1.8019,0,1.1231,2.73,0,0.2706,2.32,0,1.04,2.2013,0,1.2049],
// 4 0 2.67 0 1.16 2.609 0 1.021 3.5717 0 1.0449 3.824 0 1.342
  [4,0,2.67,0,1.16,2.609,0,1.021,3.5717,0,1.0449,3.824,0,1.342],
// 4 0 2.57 0 1.38 2.67 0 1.16 3.824 0 1.342 2.56 0 1.59
  [4,0,2.57,0,1.38,2.67,0,1.16,3.824,0,1.342,2.56,0,1.59],
// 4 0 2.69 0 1.82 2.56 0 1.59 3.824 0 1.342 3.16 0 2.13
  [4,0,2.69,0,1.82,2.56,0,1.59,3.824,0,1.342,3.16,0,2.13],
// 4 0 3.16 0 2.13 3.824 0 1.342 4.23 0 1.47 4.57 0 1.66
  [4,0,3.16,0,2.13,3.824,0,1.342,4.23,0,1.47,4.57,0,1.66],
// 3 0 3.25 0 2.28 3.16 0 2.13 4.57 0 1.66
  [3,0,3.25,0,2.28,3.16,0,2.13,4.57,0,1.66],
// 4 14 3.16 0 2.13 3.25 0 2.28 3.14 0 2.53 2.69 0 1.82
  [4,14,3.16,0,2.13,3.25,0,2.28,3.14,0,2.53,2.69,0,1.82],
// 4 0 3.14 0 2.53 3.25 0 2.28 4.57 0 1.66 5.09 0 1.74
  [4,0,3.14,0,2.53,3.25,0,2.28,4.57,0,1.66,5.09,0,1.74],
// 4 0 -3.23 0 2.26 -3.93 0 1.46 -3.54 0 1.24 -3.1 0 2.08
  [4,0,-3.23,0,2.26,-3.93,0,1.46,-3.54,0,1.24,-3.1,0,2.08],
// 4 0 -4.41 0 1.58 -3.93 0 1.46 -3.23 0 2.26 -5.09 0 2.36
  [4,0,-4.41,0,1.58,-3.93,0,1.46,-3.23,0,2.26,-5.09,0,2.36],
// 3 0 -5.09 0 2.36 -4.96 0 1.65 -4.41 0 1.58
  [3,0,-5.09,0,2.36,-4.96,0,1.65,-4.41,0,1.58],
// 4 0 -5.56 0 1.61 -4.96 0 1.65 -5.09 0 2.36 -5.41 0 2.19
  [4,0,-5.56,0,1.61,-4.96,0,1.65,-5.09,0,2.36,-5.41,0,2.19],
// 3 0 5.64 0 2 5.55 0 1.69 5.85 0 1.62
  [3,0,5.64,0,2,5.55,0,1.69,5.85,0,1.62],
// 4 0 5.09 0 1.74 5.55 0 1.69 5.64 0 2 5.32 0 2.27
  [4,0,5.09,0,1.74,5.55,0,1.69,5.64,0,2,5.32,0,2.27],
// 4 0 5.09 0 1.74 5.32 0 2.27 5.16 0 2.39 3.14 0 2.53
  [4,0,5.09,0,1.74,5.32,0,2.27,5.16,0,2.39,3.14,0,2.53],
// 4 14 5.43 0 2.54 5.16 0 2.39 5.32 0 2.27 6.49 0 2.54
  [4,14,5.43,0,2.54,5.16,0,2.39,5.32,0,2.27,6.49,0,2.54],
// 3 14 6.49 0 2.54 5.32 0 2.27 5.64 0 2
  [3,14,6.49,0,2.54,5.32,0,2.27,5.64,0,2],
// 4 14 6.49 0 2.54 5.64 0 2 5.85 0 1.62 6.96 0 1.46
  [4,14,6.49,0,2.54,5.64,0,2,5.85,0,1.62,6.96,0,1.46],
// 4 14 2.32 0 1.04 2.609 0 1.021 2.67 0 1.16 2.57 0 1.38
  [4,14,2.32,0,1.04,2.609,0,1.021,2.67,0,1.16,2.57,0,1.38],
// 4 14 2.2013 0 1.2049 2.32 0 1.04 2.57 0 1.38 2.56 0 1.59
  [4,14,2.2013,0,1.2049,2.32,0,1.04,2.57,0,1.38,2.56,0,1.59],
// 4 14 1.8019 0 1.1231 2.2013 0 1.2049 2.56 0 1.59 2.69 0 1.82
  [4,14,1.8019,0,1.1231,2.2013,0,1.2049,2.56,0,1.59,2.69,0,1.82],
// 4 14 2.69 0 1.82 3.14 0 2.53 0.43 0 0.98 0.89 0 0.94
  [4,14,2.69,0,1.82,3.14,0,2.53,0.43,0,0.98,0.89,0,0.94],
// 4 14 2.69 0 1.82 0.89 0 0.94 1.3901 0 0.9787 1.8019 0 1.1231
  [4,14,2.69,0,1.82,0.89,0,0.94,1.3901,0,0.9787,1.8019,0,1.1231],
// 4 14 4.57 0 1.66 4.23 0 1.47 4.0161 0 0.6231 4.2139 0 0.2357
  [4,14,4.57,0,1.66,4.23,0,1.47,4.0161,0,0.6231,4.2139,0,0.2357],
// 4 14 5.09 0 1.74 4.57 0 1.66 4.2139 0 0.2357 4.34 0 -0.25
  [4,14,5.09,0,1.74,4.57,0,1.66,4.2139,0,0.2357,4.34,0,-0.25],
// 4 14 5.55 0 1.69 5.09 0 1.74 4.34 0 -0.25 5.85 0 1.62
  [4,14,5.55,0,1.69,5.09,0,1.74,4.34,0,-0.25,5.85,0,1.62],
// 3 14 5.85 0 1.62 4.34 0 -0.25 6.96 0 1.46
  [3,14,5.85,0,1.62,4.34,0,-0.25,6.96,0,1.46],
// 4 0 -0.4 0 0.59 -0.34 0 0.87 -0.56 0 0.8 -0.55 0 0.3
  [4,0,-0.4,0,0.59,-0.34,0,0.87,-0.56,0,0.8,-0.55,0,0.3],
// 4 0 -0.55 0 0.3 -0.56 0 0.8 -0.86 0 0.81 -0.75 0 0.12
  [4,0,-0.55,0,0.3,-0.56,0,0.8,-0.86,0,0.81,-0.75,0,0.12],
// 3 0 -0.86 0 0.81 -1.05 0 -0.08 -0.75 0 0.12
  [3,0,-0.86,0,0.81,-1.05,0,-0.08,-0.75,0,0.12],
// 4 14 -3.09 0 2.49 -3.23 0 2.26 -3.1 0 2.08 -2.739 0 1.931
  [4,14,-3.09,0,2.49,-3.23,0,2.26,-3.1,0,2.08,-2.739,0,1.931],
// 4 0 -3.54 0 1.24 -3.3617 0 1.0749 -2.739 0 1.931 -3.1 0 2.08
  [4,0,-3.54,0,1.24,-3.3617,0,1.0749,-2.739,0,1.931,-3.1,0,2.08],
// 4 0 -3.09 0 2.49 -5.31 0 2.51 -5.09 0 2.36 -3.23 0 2.26
  [4,0,-3.09,0,2.49,-5.31,0,2.51,-5.09,0,2.36,-3.23,0,2.26],
// 3 0 -5.41 0 2.19 -5.75 0 1.99 -5.56 0 1.61
  [3,0,-5.41,0,2.19,-5.75,0,1.99,-5.56,0,1.61],
// 4 14 -5.31 0 2.51 -6.49 0 2.52 -5.41 0 2.19 -5.09 0 2.36
  [4,14,-5.31,0,2.51,-6.49,0,2.52,-5.41,0,2.19,-5.09,0,2.36],
// 4 14 -5.75 0 1.99 -5.41 0 2.19 -6.49 0 2.52 -6.96 0 1.46
  [4,14,-5.75,0,1.99,-5.41,0,2.19,-6.49,0,2.52,-6.96,0,1.46],
// 4 14 -5.56 0 1.61 -5.75 0 1.99 -6.96 0 1.46 -7.12 0 0.07
  [4,14,-5.56,0,1.61,-5.75,0,1.99,-6.96,0,1.46,-7.12,0,0.07],
// 4 14 -4.96 0 1.65 -5.56 0 1.61 -7.12 0 0.07 -4.2139 0 0.2357
  [4,14,-4.96,0,1.65,-5.56,0,1.61,-7.12,0,0.07,-4.2139,0,0.2357],
// 4 14 -4.41 0 1.58 -4.96 0 1.65 -4.0561 0 0.5931 -3.7639 0 0.934
  [4,14,-4.41,0,1.58,-4.96,0,1.65,-4.0561,0,0.5931,-3.7639,0,0.934],
// 4 14 -3.93 0 1.46 -4.41 0 1.58 -3.7639 0 0.934 -3.54 0 1.24
  [4,14,-3.93,0,1.46,-4.41,0,1.58,-3.7639,0,0.934,-3.54,0,1.24],
// 3 14 -3.54 0 1.24 -3.7639 0 0.934 -3.3617 0 1.0749
  [3,14,-3.54,0,1.24,-3.7639,0,0.934,-3.3617,0,1.0749],
// 3 14 -4.96 0 1.65 -4.2139 0 0.2357 -4.0561 0 0.5931
  [3,14,-4.96,0,1.65,-4.2139,0,0.2357,-4.0561,0,0.5931],
// 3 14 -4.2139 0 0.2357 -7.12 0 0.07 -4.34 0 -0.25
  [3,14,-4.2139,0,0.2357,-7.12,0,0.07,-4.34,0,-0.25],
// 3 14 -7.12 0 0.07 -4.2749 0 -0.7527 -4.34 0 -0.25
  [3,14,-7.12,0,0.07,-4.2749,0,-0.7527,-4.34,0,-0.25],
// 4 14 1.18 0 -0.21 0.9 0 0.01 -1.8451 0 -0.7637 1.8451 0 -0.7637
  [4,14,1.18,0,-0.21,0.9,0,0.01,-1.8451,0,-0.7637,1.8451,0,-0.7637],
// 3 14 1.18 0 -0.21 1.8451 0 -0.7637 1.51 0 -0.31
  [3,14,1.18,0,-0.21,1.8451,0,-0.7637,1.51,0,-0.31],
// 4 14 -0.75 0 0.12 -1.05 0 -0.08 0.9 0 0.01 0.73 0 0.34
  [4,14,-0.75,0,0.12,-1.05,0,-0.08,0.9,0,0.01,0.73,0,0.34],
// 3 14 0.73 0 0.34 -0.55 0 0.3 -0.75 0 0.12
  [3,14,0.73,0,0.34,-0.55,0,0.3,-0.75,0,0.12],
// 4 14 -0.4 0 0.59 -0.55 0 0.3 0.73 0 0.34 0.53 0 0.58
  [4,14,-0.4,0,0.59,-0.55,0,0.3,0.73,0,0.34,0.53,0,0.58],
// 4 14 -0.4 0 0.59 0.53 0 0.58 0.43 0 0.8 -0.34 0 0.87
  [4,14,-0.4,0,0.59,0.53,0,0.58,0.43,0,0.8,-0.34,0,0.87],
// 3 14 0.43 0 0.98 -0.34 0 0.87 0.43 0 0.8
  [3,14,0.43,0,0.98,-0.34,0,0.87,0.43,0,0.8],
// 3 14 3.14 0 2.53 -0.34 0 0.87 0.43 0 0.98
  [3,14,3.14,0,2.53,-0.34,0,0.87,0.43,0,0.98],
];
module ldraw_lib__98138pn6(step=0, col=false, unit=2/5, alt=false, line=0.2, solid=!$preview)
    makepoly(ldraw_lib__98138pn6(solid), step=step, col=col, unit=unit, alt=alt, line=line, solid=solid);
ldraw_lib__98138pn6(line=0.2);
